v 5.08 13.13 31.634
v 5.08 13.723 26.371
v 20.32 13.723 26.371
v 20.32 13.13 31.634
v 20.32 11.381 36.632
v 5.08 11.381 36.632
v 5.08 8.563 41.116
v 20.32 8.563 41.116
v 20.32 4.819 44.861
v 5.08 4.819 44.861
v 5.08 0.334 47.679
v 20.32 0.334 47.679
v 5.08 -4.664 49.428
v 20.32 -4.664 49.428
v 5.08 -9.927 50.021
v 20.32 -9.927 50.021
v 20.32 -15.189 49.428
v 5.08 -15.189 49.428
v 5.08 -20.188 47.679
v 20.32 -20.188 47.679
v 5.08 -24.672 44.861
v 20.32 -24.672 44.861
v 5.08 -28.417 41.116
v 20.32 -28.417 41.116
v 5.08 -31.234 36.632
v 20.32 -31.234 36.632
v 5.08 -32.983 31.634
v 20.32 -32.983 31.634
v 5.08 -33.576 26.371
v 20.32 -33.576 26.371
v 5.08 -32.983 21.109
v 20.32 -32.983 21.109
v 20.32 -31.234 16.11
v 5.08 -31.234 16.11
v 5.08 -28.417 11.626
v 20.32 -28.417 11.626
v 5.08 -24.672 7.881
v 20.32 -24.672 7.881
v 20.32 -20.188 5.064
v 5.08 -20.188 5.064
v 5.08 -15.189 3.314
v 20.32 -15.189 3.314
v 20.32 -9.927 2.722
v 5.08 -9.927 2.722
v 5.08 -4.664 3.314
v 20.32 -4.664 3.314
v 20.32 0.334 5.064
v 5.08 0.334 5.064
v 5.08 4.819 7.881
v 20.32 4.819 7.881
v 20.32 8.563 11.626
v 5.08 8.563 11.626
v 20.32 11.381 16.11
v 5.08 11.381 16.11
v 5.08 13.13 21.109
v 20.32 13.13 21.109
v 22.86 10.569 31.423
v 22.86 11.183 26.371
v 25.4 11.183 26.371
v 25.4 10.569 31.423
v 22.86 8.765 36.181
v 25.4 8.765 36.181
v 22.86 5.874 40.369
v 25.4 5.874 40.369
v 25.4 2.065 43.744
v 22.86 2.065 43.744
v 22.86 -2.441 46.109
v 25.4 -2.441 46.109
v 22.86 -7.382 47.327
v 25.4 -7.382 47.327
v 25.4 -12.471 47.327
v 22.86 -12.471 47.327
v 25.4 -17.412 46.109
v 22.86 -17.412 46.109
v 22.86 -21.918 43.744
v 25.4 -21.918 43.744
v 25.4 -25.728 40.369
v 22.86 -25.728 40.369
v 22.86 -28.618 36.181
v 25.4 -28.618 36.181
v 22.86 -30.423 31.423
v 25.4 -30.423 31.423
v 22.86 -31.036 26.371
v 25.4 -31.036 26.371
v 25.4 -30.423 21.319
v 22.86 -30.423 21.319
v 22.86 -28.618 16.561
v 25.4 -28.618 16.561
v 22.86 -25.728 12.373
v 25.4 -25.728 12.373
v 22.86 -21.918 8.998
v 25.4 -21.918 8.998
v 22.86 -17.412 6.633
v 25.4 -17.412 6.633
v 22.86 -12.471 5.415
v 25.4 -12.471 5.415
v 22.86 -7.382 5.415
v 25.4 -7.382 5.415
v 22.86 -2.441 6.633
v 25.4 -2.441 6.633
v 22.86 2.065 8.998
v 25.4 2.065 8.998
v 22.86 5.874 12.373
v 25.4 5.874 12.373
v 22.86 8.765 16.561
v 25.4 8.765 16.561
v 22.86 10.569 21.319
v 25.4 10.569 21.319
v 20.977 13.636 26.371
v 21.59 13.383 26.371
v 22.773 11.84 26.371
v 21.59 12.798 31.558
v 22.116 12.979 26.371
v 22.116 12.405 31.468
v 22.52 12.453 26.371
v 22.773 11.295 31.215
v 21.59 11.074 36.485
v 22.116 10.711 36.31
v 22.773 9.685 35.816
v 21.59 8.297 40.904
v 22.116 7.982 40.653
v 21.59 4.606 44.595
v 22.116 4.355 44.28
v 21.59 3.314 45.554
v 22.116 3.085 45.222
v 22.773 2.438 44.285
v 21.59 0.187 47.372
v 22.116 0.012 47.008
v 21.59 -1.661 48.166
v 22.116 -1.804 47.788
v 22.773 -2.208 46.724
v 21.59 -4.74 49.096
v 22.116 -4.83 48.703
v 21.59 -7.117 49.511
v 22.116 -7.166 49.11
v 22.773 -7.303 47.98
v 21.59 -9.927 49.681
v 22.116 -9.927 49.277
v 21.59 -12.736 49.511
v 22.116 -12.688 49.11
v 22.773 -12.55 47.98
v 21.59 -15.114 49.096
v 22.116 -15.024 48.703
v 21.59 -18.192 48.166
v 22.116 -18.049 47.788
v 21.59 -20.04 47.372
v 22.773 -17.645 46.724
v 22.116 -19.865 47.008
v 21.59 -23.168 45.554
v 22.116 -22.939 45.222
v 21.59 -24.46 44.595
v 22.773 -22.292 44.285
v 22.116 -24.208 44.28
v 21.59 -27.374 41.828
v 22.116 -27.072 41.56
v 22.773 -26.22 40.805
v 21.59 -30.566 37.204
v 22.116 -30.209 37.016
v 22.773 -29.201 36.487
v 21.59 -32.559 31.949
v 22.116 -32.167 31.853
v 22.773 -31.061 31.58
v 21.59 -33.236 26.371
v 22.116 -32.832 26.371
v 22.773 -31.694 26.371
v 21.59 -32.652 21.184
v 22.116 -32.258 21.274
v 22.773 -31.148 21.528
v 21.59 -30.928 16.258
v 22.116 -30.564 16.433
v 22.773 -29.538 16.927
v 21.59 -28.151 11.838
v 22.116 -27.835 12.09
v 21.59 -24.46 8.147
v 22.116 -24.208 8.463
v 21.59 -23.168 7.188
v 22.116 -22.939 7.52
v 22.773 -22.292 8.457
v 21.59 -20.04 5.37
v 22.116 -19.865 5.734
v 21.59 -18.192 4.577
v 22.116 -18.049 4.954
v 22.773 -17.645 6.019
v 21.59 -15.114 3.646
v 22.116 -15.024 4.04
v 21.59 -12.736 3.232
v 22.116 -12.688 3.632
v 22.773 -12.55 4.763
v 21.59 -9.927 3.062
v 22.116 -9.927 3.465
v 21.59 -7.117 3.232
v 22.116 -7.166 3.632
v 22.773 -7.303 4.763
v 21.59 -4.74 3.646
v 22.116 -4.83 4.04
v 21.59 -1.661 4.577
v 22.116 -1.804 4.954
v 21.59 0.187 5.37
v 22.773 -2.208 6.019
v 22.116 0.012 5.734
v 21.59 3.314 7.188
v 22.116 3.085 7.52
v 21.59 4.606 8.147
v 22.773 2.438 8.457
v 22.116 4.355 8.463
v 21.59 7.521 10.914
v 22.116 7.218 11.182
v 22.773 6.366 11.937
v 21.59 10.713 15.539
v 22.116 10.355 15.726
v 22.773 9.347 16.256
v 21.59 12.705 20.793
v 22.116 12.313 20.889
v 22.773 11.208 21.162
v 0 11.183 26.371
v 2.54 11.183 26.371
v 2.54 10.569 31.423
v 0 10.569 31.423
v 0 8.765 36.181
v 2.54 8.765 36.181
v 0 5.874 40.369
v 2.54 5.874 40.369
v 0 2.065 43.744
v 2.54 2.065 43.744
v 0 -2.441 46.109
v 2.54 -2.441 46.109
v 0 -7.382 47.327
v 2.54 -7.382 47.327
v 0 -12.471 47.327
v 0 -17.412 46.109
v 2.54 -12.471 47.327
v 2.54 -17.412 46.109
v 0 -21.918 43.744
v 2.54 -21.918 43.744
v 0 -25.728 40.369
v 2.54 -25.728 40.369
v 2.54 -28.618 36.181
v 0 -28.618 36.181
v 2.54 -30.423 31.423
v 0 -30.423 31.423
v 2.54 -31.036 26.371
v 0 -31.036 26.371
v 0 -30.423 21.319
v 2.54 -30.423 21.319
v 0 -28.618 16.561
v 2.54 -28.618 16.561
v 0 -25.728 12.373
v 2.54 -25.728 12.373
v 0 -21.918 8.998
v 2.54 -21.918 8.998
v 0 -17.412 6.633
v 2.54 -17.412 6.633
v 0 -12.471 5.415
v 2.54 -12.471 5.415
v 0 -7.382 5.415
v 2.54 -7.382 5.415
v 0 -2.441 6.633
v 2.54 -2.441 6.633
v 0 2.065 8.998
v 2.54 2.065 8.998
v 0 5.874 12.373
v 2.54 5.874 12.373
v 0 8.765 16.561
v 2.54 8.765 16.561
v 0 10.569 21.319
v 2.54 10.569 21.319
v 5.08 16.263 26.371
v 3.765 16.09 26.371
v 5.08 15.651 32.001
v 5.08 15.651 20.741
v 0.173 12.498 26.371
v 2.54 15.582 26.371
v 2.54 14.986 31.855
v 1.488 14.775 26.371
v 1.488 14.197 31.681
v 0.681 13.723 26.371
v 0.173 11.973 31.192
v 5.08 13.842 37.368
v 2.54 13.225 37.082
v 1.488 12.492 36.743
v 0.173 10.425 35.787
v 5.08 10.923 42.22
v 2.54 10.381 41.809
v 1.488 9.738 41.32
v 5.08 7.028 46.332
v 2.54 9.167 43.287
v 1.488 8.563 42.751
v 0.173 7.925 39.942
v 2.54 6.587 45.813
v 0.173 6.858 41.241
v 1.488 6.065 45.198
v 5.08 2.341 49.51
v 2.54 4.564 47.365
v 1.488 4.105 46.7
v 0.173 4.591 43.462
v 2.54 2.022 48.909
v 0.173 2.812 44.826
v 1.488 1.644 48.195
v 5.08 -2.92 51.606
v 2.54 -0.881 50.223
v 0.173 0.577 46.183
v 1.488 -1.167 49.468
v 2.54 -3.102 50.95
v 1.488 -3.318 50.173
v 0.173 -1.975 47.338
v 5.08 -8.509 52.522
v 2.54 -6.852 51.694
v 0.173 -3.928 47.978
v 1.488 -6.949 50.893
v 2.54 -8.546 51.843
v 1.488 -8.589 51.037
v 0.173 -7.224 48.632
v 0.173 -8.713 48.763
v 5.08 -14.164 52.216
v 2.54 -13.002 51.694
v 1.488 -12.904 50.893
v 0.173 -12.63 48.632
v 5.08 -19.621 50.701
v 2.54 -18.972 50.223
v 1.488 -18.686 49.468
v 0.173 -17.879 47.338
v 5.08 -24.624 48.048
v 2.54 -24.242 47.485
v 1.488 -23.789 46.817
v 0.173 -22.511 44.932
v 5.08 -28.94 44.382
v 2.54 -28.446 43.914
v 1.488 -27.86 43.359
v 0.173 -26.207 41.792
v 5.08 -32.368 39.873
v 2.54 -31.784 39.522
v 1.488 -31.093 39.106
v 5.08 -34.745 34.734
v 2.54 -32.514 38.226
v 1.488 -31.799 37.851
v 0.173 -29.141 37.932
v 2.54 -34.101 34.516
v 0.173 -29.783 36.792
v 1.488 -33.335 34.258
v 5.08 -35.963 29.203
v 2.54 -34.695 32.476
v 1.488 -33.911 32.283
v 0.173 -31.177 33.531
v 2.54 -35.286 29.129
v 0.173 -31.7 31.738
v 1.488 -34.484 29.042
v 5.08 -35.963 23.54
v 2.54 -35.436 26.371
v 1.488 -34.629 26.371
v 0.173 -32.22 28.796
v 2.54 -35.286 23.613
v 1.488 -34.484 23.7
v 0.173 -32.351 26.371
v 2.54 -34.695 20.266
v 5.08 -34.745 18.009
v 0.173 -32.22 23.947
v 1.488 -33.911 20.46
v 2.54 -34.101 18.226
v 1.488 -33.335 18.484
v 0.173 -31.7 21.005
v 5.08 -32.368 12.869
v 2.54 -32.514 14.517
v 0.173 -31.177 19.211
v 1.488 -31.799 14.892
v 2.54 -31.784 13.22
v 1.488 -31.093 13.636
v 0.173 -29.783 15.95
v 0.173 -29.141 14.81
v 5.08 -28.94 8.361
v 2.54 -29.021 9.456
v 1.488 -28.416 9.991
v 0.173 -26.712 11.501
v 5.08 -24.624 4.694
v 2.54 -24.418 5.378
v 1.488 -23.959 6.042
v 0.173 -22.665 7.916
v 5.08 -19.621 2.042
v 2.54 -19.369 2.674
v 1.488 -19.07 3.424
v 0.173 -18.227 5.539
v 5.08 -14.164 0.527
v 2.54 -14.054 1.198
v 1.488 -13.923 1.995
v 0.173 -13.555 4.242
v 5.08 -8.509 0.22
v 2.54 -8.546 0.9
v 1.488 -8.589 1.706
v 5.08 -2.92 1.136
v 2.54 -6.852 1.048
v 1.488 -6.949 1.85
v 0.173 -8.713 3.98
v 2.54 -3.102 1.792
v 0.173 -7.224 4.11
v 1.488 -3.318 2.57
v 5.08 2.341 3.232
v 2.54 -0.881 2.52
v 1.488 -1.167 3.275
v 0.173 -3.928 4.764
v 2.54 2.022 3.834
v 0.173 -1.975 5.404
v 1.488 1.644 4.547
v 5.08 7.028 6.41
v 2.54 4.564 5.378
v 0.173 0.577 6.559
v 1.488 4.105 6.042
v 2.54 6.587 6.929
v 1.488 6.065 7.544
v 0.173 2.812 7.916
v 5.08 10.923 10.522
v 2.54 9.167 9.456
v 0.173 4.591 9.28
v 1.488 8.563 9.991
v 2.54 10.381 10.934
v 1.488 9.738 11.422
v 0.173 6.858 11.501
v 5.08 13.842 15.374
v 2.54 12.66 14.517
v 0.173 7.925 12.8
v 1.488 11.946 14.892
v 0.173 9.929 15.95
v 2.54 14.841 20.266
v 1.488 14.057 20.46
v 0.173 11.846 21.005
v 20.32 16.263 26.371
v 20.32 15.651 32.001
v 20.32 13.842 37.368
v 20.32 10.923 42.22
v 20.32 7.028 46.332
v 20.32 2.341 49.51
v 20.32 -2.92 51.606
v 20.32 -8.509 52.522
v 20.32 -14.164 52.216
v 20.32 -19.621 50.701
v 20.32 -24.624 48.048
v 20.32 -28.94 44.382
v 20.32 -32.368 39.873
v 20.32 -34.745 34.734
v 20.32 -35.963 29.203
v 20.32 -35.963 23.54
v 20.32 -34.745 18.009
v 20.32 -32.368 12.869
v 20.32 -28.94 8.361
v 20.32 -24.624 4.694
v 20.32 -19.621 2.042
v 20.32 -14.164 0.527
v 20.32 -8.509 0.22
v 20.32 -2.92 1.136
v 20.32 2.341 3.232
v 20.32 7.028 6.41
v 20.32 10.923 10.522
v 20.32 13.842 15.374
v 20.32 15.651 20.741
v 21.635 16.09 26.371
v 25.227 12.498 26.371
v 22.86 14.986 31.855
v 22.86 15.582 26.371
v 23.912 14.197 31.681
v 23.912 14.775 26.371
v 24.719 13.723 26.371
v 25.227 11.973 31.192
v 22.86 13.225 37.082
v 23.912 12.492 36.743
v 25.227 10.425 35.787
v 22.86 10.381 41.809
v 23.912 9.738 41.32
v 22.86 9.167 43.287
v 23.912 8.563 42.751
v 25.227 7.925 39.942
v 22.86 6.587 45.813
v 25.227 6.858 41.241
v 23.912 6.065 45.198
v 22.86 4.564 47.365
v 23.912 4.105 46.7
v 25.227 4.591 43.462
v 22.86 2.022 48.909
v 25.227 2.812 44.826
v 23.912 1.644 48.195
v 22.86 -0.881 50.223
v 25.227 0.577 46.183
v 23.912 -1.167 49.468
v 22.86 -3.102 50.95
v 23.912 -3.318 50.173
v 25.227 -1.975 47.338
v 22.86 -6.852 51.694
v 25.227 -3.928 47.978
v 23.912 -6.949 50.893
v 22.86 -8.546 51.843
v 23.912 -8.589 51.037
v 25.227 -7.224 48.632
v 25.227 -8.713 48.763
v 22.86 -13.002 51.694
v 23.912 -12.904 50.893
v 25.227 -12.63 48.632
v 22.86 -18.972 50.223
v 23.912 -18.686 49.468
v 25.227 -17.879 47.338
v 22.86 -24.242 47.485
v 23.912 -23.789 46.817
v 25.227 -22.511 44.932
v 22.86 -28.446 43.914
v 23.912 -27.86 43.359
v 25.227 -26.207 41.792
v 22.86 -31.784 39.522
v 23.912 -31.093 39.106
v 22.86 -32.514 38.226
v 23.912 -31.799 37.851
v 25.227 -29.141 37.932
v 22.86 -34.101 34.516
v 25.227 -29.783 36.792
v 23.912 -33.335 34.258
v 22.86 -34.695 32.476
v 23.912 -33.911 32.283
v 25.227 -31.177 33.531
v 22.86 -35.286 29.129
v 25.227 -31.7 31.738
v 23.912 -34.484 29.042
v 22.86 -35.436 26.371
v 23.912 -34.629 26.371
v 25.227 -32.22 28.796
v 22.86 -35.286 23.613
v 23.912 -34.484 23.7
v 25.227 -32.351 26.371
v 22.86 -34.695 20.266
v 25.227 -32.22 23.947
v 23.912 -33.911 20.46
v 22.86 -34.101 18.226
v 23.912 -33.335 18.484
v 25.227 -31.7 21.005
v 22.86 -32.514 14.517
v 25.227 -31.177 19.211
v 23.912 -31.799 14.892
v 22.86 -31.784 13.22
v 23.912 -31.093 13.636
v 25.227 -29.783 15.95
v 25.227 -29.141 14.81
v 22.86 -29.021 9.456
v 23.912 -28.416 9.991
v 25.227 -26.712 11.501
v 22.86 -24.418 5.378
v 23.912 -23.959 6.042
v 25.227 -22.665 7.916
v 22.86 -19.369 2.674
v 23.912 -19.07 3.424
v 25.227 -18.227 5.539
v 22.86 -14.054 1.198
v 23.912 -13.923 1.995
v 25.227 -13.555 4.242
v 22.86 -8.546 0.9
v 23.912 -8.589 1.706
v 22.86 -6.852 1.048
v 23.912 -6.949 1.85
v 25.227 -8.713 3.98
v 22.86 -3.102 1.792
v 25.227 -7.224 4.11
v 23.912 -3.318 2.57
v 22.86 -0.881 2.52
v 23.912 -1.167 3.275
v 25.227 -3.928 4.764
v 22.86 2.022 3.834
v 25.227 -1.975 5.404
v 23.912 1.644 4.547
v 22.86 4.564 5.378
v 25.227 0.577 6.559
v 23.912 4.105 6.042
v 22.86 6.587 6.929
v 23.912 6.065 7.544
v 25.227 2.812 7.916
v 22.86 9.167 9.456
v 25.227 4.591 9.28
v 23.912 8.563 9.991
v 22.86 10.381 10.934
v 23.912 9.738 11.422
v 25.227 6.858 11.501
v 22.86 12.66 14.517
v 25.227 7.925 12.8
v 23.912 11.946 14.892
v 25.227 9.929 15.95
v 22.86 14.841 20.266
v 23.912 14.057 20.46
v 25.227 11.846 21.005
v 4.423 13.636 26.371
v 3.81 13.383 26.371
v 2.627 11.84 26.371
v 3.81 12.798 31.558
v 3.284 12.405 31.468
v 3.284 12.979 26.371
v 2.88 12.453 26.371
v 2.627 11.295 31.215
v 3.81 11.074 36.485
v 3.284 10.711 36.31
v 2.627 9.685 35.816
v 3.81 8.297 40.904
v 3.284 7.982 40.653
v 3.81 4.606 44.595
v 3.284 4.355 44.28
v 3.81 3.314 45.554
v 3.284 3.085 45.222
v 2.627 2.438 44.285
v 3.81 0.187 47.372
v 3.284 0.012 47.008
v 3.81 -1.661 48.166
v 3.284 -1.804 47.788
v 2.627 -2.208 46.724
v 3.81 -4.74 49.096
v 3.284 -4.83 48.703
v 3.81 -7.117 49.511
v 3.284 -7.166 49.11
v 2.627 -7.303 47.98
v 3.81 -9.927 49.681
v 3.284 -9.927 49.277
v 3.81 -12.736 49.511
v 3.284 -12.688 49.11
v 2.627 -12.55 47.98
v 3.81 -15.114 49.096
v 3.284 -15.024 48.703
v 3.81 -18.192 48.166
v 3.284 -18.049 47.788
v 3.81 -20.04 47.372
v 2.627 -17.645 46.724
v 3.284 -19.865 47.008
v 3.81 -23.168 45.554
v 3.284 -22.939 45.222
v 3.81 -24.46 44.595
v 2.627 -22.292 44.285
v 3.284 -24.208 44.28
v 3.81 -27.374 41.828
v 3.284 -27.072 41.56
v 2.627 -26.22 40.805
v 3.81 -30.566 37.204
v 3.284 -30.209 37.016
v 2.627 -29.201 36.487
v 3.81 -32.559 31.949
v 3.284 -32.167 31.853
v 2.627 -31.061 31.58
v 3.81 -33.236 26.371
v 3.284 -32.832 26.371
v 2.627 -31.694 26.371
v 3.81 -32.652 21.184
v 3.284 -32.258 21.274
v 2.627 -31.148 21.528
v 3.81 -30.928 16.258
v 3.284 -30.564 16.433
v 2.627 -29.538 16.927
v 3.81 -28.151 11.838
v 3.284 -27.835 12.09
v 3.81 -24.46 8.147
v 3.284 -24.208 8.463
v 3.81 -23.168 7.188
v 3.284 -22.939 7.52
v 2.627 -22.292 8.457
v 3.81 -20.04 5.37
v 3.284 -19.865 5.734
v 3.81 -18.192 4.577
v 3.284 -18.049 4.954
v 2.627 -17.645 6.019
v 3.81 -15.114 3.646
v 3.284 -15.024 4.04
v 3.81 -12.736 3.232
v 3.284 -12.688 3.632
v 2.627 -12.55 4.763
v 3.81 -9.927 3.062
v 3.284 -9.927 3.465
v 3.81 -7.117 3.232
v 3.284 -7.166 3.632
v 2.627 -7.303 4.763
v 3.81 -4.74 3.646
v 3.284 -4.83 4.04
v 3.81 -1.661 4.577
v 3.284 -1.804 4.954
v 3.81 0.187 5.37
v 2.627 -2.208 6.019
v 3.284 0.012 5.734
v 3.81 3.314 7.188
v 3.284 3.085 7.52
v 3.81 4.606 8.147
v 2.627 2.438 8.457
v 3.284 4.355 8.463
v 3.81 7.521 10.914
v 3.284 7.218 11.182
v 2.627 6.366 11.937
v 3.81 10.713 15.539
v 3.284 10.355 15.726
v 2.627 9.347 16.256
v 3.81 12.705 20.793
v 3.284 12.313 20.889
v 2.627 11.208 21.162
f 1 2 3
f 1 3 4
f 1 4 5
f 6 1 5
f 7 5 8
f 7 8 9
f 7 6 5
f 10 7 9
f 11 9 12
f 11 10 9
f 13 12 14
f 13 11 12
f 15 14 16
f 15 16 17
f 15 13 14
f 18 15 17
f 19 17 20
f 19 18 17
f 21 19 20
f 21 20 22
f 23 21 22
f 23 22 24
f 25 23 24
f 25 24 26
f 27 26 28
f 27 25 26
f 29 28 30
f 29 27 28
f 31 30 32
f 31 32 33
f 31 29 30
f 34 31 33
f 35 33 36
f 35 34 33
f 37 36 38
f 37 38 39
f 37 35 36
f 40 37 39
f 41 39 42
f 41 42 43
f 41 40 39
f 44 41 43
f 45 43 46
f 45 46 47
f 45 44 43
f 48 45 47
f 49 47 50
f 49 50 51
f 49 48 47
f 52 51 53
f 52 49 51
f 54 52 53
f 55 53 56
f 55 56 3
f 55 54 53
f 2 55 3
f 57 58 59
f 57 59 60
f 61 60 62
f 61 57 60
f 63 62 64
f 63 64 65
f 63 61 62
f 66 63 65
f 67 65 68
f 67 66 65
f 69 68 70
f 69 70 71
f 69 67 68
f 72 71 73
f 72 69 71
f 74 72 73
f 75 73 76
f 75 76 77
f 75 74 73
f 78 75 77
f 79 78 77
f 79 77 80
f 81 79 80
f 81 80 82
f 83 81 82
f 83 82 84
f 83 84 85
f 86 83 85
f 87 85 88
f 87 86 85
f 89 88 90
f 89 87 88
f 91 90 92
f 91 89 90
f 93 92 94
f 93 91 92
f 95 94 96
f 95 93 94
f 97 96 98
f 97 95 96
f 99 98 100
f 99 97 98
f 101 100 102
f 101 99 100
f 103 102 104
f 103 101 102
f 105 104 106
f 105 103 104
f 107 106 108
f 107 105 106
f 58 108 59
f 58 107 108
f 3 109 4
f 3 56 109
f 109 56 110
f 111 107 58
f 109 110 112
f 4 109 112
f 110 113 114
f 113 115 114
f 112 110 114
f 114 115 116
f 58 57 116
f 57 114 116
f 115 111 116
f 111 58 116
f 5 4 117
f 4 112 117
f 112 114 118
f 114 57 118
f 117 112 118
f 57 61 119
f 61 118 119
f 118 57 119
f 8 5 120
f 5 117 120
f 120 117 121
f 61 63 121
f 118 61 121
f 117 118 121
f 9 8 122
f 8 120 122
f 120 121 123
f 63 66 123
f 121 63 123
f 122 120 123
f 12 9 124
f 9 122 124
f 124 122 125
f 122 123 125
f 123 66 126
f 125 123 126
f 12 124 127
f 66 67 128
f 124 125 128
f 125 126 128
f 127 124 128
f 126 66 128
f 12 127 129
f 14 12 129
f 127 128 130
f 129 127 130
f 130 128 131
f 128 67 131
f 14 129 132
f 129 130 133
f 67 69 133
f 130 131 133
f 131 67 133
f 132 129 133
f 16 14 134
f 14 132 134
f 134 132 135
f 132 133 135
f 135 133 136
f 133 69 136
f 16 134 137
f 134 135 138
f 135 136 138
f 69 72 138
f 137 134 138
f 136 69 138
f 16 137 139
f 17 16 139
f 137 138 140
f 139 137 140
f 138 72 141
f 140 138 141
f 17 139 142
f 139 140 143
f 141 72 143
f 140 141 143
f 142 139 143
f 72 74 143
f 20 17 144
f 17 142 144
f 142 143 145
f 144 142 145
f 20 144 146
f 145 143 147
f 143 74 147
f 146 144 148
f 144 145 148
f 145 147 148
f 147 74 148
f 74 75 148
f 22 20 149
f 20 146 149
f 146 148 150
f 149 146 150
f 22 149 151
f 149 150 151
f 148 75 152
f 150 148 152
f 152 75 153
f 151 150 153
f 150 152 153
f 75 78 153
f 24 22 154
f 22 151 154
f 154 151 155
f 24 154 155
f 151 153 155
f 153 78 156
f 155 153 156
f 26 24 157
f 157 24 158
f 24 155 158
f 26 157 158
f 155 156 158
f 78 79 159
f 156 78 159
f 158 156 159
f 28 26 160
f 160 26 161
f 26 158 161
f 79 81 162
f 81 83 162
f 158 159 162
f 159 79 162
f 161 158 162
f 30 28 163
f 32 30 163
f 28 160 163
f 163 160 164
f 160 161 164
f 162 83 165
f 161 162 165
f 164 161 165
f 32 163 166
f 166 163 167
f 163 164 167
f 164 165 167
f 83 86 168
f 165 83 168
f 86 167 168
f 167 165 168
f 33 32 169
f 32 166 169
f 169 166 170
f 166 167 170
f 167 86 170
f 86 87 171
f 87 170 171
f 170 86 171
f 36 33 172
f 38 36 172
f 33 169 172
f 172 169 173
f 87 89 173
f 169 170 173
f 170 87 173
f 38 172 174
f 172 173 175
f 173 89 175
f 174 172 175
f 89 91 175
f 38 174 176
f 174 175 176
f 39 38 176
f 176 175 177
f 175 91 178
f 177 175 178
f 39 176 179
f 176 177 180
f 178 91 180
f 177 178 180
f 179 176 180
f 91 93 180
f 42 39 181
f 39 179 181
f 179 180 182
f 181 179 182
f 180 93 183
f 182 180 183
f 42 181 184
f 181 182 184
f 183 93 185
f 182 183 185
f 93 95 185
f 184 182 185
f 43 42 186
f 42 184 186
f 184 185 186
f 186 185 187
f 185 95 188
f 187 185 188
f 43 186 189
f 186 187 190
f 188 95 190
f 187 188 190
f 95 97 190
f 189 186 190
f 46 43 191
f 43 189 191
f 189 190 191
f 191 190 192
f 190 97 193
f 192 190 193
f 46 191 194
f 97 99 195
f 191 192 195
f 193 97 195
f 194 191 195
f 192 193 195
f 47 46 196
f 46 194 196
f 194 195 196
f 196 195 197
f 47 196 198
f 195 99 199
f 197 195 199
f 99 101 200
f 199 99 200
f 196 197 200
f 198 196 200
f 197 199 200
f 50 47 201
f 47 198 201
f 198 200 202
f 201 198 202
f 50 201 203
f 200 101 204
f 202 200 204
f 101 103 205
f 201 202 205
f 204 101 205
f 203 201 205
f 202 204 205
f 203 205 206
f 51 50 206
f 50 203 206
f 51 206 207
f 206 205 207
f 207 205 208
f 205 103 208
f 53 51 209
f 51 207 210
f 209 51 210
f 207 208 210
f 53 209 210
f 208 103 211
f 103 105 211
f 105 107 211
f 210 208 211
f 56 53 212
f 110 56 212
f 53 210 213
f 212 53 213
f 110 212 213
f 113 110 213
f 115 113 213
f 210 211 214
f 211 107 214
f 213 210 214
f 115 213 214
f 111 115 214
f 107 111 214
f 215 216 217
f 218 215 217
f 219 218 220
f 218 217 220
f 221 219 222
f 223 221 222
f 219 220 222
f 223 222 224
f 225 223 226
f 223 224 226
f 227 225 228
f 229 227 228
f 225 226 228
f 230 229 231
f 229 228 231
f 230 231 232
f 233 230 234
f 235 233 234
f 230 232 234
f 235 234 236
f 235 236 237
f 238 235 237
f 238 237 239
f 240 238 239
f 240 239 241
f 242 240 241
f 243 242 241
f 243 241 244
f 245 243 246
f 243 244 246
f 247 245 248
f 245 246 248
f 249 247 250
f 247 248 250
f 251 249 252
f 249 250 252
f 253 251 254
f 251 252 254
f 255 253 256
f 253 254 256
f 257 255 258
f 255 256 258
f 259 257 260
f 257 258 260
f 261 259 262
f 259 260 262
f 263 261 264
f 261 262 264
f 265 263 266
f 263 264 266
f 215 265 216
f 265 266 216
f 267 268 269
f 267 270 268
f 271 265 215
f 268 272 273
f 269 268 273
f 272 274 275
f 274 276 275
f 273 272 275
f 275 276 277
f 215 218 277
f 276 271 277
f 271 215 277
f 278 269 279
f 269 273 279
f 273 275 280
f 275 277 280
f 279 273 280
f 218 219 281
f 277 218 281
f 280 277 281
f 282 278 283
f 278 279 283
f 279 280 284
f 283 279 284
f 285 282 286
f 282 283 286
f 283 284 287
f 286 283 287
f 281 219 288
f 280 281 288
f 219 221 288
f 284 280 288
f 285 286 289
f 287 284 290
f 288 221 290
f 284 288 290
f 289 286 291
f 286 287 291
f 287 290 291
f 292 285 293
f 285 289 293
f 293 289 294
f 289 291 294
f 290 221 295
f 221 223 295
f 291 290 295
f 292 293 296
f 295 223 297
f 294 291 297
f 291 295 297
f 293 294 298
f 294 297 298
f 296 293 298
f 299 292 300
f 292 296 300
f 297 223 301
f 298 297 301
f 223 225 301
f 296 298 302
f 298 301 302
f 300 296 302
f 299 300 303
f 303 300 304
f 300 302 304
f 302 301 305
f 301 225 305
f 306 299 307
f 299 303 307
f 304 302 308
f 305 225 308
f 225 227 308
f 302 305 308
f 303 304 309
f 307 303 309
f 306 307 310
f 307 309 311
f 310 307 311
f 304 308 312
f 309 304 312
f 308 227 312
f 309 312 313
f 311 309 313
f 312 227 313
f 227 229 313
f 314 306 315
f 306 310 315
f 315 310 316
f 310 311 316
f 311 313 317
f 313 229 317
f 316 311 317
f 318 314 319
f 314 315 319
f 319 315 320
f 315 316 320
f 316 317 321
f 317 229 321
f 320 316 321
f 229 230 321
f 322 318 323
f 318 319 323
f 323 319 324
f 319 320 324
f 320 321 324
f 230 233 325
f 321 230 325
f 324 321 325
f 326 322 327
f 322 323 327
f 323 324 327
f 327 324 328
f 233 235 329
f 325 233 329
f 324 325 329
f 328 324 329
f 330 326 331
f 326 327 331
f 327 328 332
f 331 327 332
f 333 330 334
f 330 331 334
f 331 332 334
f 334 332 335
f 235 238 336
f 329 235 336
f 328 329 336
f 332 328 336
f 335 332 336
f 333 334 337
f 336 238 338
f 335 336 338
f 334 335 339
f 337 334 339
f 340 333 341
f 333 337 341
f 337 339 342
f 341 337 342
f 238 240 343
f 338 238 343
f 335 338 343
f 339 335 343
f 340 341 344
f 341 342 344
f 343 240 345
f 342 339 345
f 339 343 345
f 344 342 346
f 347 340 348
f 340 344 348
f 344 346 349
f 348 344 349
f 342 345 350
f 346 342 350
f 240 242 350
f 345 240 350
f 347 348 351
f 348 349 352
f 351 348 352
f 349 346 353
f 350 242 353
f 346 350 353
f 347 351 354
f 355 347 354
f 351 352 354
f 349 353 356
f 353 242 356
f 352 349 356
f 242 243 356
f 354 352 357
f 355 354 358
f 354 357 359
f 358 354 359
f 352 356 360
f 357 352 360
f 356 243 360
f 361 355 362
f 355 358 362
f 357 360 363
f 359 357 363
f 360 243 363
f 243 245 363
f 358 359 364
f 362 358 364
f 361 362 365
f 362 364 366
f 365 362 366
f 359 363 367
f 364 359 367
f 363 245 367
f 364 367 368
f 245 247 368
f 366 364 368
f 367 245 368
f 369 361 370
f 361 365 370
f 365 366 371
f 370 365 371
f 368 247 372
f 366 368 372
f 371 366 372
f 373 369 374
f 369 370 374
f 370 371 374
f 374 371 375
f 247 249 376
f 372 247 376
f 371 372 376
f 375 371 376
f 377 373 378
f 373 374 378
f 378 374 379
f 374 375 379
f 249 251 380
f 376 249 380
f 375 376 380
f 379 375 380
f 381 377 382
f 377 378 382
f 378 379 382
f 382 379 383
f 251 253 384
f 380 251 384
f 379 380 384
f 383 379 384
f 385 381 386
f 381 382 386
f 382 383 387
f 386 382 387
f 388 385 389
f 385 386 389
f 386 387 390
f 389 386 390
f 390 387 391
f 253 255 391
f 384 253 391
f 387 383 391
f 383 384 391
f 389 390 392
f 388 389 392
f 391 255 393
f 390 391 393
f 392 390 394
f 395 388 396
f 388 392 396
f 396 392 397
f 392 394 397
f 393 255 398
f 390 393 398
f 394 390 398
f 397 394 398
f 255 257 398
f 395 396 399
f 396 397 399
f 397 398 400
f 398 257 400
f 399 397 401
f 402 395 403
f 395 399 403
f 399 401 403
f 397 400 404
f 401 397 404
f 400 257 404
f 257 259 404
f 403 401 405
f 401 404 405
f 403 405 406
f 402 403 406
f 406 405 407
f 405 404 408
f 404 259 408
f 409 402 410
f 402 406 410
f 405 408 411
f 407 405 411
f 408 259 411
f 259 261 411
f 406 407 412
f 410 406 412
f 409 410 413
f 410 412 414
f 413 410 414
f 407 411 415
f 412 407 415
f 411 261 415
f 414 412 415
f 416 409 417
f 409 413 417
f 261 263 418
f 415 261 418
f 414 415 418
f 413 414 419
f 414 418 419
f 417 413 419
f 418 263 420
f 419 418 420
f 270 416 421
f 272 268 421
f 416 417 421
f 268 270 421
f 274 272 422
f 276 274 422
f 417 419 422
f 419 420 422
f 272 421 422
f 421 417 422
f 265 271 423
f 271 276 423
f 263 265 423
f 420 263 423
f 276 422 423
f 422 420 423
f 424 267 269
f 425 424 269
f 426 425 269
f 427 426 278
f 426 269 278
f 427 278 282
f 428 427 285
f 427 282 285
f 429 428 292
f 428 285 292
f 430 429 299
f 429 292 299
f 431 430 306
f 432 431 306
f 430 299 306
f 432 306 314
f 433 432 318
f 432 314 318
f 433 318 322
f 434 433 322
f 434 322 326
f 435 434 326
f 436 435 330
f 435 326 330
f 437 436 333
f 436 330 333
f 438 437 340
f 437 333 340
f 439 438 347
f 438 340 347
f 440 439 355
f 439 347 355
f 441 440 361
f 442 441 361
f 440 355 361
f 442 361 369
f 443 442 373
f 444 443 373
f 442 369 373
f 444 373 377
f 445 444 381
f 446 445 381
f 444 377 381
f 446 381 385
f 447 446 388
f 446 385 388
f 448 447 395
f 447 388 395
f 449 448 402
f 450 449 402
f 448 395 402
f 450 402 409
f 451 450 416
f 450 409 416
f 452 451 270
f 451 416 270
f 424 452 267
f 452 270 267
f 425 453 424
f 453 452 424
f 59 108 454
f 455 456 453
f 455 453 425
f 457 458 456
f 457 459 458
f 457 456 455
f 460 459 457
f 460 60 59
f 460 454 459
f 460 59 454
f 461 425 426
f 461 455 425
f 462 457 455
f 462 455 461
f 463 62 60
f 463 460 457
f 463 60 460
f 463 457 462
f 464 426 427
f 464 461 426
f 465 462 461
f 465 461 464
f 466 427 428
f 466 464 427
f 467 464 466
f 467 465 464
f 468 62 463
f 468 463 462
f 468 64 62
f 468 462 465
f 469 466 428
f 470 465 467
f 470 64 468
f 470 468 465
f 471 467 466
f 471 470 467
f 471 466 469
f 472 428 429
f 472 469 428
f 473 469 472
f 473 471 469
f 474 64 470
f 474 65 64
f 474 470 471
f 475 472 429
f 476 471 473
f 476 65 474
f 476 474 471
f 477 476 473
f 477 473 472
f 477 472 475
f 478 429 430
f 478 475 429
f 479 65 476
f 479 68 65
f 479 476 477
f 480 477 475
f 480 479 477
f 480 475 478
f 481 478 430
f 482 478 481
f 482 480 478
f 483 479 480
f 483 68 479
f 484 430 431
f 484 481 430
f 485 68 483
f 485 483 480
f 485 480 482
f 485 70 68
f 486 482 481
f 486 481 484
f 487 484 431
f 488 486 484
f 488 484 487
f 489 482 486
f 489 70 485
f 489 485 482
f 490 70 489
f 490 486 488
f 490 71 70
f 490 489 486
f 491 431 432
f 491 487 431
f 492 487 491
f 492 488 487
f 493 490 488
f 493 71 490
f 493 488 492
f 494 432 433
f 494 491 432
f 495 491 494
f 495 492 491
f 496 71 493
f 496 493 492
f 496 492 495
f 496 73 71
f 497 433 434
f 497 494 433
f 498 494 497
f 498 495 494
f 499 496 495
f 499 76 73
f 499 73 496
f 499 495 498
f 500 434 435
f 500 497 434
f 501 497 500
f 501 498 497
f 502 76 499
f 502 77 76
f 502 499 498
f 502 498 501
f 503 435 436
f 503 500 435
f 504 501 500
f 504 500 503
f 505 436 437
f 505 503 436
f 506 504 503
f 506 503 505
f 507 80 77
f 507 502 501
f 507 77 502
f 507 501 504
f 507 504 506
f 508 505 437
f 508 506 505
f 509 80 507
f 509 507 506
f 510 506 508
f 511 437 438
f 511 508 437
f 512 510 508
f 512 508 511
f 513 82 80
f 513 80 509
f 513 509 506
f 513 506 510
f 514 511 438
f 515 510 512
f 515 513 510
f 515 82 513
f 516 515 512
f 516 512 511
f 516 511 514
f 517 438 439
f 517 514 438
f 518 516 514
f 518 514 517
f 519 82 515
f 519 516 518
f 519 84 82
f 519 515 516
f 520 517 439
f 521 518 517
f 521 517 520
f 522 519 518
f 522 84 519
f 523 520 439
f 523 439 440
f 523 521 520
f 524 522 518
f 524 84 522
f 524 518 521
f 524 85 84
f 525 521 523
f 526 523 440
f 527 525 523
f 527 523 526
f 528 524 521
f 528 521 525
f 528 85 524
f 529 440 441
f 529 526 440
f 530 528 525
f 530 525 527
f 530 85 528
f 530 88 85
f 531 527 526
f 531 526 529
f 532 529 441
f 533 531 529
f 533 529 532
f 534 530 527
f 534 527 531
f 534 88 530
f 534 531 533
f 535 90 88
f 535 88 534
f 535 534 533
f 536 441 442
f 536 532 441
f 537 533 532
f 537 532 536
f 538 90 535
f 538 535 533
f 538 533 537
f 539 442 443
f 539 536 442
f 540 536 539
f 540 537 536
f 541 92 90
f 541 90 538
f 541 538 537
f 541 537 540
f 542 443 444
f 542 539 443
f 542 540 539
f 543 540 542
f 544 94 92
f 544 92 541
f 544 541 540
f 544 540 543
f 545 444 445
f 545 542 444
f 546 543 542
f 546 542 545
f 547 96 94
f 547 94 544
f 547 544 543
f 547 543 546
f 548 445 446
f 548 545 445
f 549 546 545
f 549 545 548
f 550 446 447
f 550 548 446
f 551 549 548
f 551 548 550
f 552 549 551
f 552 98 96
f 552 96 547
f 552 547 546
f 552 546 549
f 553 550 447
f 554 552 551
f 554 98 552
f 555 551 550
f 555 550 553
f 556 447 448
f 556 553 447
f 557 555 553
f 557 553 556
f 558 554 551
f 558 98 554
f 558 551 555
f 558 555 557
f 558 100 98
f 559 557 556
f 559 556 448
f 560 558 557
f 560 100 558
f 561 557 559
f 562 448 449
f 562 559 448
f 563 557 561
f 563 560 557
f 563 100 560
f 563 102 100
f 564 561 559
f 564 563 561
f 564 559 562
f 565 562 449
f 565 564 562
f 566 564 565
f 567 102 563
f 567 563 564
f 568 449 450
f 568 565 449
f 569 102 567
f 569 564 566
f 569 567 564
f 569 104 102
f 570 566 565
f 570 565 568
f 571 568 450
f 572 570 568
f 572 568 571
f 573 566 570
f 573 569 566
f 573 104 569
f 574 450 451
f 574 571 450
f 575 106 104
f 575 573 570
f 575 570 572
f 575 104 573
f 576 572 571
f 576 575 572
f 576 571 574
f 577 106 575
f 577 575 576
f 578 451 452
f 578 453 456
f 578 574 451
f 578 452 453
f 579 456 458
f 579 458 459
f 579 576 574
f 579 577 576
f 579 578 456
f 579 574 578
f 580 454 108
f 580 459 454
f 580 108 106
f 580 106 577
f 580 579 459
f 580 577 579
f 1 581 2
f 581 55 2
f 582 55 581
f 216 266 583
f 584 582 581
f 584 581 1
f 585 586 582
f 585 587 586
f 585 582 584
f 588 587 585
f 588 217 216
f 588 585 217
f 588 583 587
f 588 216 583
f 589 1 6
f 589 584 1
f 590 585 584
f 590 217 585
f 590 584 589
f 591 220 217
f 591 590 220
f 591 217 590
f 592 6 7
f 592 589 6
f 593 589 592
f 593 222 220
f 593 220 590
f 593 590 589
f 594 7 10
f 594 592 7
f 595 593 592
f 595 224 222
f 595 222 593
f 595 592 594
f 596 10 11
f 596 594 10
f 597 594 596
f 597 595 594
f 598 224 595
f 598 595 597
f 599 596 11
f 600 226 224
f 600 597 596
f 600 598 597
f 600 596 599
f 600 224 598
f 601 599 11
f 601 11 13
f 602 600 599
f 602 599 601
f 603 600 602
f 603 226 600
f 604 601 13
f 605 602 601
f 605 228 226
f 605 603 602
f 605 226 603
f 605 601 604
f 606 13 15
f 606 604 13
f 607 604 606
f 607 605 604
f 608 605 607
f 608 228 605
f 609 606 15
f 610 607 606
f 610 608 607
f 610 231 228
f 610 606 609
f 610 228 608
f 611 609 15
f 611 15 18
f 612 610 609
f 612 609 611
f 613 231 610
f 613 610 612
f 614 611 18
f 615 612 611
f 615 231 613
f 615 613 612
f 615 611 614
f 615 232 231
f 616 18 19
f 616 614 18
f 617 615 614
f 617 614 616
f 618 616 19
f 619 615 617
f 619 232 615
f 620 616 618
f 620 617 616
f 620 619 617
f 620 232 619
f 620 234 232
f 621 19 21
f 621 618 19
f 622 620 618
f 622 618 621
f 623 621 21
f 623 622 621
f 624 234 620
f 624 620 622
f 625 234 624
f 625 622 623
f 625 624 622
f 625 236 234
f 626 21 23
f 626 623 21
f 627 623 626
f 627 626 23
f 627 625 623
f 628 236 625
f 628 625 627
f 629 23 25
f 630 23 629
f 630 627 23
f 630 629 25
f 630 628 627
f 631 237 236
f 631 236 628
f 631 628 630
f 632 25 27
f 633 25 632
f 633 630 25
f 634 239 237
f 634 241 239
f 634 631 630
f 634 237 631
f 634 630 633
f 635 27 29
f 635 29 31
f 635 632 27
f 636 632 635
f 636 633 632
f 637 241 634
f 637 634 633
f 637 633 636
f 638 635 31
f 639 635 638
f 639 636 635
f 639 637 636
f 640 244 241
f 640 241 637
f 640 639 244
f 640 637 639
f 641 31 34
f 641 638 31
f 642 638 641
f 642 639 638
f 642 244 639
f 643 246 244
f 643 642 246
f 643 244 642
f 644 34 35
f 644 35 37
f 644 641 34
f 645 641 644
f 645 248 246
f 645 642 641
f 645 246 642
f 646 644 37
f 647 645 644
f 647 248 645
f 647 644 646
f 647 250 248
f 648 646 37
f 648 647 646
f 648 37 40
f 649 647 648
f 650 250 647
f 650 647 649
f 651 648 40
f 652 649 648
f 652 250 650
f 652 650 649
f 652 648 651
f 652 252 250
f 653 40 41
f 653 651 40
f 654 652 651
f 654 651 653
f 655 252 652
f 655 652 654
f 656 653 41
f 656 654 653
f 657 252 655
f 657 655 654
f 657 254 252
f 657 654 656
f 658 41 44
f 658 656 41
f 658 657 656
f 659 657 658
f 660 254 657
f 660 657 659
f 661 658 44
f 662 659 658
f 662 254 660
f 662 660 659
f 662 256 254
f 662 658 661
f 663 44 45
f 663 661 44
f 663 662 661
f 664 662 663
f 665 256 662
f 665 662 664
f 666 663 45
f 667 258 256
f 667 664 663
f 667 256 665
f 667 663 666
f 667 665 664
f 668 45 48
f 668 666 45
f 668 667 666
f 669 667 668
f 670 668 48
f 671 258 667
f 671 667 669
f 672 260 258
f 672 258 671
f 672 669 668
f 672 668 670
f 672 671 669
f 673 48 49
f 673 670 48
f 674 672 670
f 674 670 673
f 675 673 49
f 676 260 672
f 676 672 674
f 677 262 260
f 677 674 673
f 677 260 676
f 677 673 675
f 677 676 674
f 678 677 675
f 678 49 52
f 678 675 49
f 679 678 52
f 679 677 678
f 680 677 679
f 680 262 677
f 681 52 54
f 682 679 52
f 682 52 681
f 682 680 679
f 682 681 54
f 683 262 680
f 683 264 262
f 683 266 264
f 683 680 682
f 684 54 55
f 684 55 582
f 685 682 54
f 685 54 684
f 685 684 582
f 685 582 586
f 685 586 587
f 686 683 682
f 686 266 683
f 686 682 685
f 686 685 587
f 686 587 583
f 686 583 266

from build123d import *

# Parameters (mm, degrees)
F0_R     = 26.1896529573
F1_DEPTH = 25.4
F2_R     = 5.08
F3_T     = -2.54


# Not quite as in the source:
# - a shell that OpenCascade refuses in one call is made with other operations: the cavity is built on its own and cut out


with BuildPart() as f1:
    # F0 (on Right) → F1 (new body)
    with BuildSketch(Plane.YZ):
        with Locations((-9.9267605692, 26.3711642474)):
            Circle(F0_R)
    extrude(amount=F1_DEPTH)

    # F2
    f2_edges = [f1.edges().sort_by_distance(p)[0] for p in [
        (25.4, -36.116414, 26.371164),
        (0, -36.116414, 26.371164),
        (12.7, 16.262892, 26.371164),
    ]]
    fillet(f2_edges, radius=F2_R)

    # F3: a shell. OpenCascade refuses it in one call, so the cavity is built on its own and cut out:
    # the body offset inwards by the wall thickness, plus a prism from it out through each open face.
    f3_core = offset(f1.part, amount=F3_T, mode=Mode.PRIVATE)
    f3_exits = [f3_core.faces().sort_by_distance(p)[0] for p in [
        (22.86, -9.926761, 26.371164),
        (2.54, -9.926761, 26.371164),
    ]]
    add(f3_core, mode=Mode.SUBTRACT)
    extrude(f3_exits, amount=-F3_T, mode=Mode.SUBTRACT)


solid = f1.part
